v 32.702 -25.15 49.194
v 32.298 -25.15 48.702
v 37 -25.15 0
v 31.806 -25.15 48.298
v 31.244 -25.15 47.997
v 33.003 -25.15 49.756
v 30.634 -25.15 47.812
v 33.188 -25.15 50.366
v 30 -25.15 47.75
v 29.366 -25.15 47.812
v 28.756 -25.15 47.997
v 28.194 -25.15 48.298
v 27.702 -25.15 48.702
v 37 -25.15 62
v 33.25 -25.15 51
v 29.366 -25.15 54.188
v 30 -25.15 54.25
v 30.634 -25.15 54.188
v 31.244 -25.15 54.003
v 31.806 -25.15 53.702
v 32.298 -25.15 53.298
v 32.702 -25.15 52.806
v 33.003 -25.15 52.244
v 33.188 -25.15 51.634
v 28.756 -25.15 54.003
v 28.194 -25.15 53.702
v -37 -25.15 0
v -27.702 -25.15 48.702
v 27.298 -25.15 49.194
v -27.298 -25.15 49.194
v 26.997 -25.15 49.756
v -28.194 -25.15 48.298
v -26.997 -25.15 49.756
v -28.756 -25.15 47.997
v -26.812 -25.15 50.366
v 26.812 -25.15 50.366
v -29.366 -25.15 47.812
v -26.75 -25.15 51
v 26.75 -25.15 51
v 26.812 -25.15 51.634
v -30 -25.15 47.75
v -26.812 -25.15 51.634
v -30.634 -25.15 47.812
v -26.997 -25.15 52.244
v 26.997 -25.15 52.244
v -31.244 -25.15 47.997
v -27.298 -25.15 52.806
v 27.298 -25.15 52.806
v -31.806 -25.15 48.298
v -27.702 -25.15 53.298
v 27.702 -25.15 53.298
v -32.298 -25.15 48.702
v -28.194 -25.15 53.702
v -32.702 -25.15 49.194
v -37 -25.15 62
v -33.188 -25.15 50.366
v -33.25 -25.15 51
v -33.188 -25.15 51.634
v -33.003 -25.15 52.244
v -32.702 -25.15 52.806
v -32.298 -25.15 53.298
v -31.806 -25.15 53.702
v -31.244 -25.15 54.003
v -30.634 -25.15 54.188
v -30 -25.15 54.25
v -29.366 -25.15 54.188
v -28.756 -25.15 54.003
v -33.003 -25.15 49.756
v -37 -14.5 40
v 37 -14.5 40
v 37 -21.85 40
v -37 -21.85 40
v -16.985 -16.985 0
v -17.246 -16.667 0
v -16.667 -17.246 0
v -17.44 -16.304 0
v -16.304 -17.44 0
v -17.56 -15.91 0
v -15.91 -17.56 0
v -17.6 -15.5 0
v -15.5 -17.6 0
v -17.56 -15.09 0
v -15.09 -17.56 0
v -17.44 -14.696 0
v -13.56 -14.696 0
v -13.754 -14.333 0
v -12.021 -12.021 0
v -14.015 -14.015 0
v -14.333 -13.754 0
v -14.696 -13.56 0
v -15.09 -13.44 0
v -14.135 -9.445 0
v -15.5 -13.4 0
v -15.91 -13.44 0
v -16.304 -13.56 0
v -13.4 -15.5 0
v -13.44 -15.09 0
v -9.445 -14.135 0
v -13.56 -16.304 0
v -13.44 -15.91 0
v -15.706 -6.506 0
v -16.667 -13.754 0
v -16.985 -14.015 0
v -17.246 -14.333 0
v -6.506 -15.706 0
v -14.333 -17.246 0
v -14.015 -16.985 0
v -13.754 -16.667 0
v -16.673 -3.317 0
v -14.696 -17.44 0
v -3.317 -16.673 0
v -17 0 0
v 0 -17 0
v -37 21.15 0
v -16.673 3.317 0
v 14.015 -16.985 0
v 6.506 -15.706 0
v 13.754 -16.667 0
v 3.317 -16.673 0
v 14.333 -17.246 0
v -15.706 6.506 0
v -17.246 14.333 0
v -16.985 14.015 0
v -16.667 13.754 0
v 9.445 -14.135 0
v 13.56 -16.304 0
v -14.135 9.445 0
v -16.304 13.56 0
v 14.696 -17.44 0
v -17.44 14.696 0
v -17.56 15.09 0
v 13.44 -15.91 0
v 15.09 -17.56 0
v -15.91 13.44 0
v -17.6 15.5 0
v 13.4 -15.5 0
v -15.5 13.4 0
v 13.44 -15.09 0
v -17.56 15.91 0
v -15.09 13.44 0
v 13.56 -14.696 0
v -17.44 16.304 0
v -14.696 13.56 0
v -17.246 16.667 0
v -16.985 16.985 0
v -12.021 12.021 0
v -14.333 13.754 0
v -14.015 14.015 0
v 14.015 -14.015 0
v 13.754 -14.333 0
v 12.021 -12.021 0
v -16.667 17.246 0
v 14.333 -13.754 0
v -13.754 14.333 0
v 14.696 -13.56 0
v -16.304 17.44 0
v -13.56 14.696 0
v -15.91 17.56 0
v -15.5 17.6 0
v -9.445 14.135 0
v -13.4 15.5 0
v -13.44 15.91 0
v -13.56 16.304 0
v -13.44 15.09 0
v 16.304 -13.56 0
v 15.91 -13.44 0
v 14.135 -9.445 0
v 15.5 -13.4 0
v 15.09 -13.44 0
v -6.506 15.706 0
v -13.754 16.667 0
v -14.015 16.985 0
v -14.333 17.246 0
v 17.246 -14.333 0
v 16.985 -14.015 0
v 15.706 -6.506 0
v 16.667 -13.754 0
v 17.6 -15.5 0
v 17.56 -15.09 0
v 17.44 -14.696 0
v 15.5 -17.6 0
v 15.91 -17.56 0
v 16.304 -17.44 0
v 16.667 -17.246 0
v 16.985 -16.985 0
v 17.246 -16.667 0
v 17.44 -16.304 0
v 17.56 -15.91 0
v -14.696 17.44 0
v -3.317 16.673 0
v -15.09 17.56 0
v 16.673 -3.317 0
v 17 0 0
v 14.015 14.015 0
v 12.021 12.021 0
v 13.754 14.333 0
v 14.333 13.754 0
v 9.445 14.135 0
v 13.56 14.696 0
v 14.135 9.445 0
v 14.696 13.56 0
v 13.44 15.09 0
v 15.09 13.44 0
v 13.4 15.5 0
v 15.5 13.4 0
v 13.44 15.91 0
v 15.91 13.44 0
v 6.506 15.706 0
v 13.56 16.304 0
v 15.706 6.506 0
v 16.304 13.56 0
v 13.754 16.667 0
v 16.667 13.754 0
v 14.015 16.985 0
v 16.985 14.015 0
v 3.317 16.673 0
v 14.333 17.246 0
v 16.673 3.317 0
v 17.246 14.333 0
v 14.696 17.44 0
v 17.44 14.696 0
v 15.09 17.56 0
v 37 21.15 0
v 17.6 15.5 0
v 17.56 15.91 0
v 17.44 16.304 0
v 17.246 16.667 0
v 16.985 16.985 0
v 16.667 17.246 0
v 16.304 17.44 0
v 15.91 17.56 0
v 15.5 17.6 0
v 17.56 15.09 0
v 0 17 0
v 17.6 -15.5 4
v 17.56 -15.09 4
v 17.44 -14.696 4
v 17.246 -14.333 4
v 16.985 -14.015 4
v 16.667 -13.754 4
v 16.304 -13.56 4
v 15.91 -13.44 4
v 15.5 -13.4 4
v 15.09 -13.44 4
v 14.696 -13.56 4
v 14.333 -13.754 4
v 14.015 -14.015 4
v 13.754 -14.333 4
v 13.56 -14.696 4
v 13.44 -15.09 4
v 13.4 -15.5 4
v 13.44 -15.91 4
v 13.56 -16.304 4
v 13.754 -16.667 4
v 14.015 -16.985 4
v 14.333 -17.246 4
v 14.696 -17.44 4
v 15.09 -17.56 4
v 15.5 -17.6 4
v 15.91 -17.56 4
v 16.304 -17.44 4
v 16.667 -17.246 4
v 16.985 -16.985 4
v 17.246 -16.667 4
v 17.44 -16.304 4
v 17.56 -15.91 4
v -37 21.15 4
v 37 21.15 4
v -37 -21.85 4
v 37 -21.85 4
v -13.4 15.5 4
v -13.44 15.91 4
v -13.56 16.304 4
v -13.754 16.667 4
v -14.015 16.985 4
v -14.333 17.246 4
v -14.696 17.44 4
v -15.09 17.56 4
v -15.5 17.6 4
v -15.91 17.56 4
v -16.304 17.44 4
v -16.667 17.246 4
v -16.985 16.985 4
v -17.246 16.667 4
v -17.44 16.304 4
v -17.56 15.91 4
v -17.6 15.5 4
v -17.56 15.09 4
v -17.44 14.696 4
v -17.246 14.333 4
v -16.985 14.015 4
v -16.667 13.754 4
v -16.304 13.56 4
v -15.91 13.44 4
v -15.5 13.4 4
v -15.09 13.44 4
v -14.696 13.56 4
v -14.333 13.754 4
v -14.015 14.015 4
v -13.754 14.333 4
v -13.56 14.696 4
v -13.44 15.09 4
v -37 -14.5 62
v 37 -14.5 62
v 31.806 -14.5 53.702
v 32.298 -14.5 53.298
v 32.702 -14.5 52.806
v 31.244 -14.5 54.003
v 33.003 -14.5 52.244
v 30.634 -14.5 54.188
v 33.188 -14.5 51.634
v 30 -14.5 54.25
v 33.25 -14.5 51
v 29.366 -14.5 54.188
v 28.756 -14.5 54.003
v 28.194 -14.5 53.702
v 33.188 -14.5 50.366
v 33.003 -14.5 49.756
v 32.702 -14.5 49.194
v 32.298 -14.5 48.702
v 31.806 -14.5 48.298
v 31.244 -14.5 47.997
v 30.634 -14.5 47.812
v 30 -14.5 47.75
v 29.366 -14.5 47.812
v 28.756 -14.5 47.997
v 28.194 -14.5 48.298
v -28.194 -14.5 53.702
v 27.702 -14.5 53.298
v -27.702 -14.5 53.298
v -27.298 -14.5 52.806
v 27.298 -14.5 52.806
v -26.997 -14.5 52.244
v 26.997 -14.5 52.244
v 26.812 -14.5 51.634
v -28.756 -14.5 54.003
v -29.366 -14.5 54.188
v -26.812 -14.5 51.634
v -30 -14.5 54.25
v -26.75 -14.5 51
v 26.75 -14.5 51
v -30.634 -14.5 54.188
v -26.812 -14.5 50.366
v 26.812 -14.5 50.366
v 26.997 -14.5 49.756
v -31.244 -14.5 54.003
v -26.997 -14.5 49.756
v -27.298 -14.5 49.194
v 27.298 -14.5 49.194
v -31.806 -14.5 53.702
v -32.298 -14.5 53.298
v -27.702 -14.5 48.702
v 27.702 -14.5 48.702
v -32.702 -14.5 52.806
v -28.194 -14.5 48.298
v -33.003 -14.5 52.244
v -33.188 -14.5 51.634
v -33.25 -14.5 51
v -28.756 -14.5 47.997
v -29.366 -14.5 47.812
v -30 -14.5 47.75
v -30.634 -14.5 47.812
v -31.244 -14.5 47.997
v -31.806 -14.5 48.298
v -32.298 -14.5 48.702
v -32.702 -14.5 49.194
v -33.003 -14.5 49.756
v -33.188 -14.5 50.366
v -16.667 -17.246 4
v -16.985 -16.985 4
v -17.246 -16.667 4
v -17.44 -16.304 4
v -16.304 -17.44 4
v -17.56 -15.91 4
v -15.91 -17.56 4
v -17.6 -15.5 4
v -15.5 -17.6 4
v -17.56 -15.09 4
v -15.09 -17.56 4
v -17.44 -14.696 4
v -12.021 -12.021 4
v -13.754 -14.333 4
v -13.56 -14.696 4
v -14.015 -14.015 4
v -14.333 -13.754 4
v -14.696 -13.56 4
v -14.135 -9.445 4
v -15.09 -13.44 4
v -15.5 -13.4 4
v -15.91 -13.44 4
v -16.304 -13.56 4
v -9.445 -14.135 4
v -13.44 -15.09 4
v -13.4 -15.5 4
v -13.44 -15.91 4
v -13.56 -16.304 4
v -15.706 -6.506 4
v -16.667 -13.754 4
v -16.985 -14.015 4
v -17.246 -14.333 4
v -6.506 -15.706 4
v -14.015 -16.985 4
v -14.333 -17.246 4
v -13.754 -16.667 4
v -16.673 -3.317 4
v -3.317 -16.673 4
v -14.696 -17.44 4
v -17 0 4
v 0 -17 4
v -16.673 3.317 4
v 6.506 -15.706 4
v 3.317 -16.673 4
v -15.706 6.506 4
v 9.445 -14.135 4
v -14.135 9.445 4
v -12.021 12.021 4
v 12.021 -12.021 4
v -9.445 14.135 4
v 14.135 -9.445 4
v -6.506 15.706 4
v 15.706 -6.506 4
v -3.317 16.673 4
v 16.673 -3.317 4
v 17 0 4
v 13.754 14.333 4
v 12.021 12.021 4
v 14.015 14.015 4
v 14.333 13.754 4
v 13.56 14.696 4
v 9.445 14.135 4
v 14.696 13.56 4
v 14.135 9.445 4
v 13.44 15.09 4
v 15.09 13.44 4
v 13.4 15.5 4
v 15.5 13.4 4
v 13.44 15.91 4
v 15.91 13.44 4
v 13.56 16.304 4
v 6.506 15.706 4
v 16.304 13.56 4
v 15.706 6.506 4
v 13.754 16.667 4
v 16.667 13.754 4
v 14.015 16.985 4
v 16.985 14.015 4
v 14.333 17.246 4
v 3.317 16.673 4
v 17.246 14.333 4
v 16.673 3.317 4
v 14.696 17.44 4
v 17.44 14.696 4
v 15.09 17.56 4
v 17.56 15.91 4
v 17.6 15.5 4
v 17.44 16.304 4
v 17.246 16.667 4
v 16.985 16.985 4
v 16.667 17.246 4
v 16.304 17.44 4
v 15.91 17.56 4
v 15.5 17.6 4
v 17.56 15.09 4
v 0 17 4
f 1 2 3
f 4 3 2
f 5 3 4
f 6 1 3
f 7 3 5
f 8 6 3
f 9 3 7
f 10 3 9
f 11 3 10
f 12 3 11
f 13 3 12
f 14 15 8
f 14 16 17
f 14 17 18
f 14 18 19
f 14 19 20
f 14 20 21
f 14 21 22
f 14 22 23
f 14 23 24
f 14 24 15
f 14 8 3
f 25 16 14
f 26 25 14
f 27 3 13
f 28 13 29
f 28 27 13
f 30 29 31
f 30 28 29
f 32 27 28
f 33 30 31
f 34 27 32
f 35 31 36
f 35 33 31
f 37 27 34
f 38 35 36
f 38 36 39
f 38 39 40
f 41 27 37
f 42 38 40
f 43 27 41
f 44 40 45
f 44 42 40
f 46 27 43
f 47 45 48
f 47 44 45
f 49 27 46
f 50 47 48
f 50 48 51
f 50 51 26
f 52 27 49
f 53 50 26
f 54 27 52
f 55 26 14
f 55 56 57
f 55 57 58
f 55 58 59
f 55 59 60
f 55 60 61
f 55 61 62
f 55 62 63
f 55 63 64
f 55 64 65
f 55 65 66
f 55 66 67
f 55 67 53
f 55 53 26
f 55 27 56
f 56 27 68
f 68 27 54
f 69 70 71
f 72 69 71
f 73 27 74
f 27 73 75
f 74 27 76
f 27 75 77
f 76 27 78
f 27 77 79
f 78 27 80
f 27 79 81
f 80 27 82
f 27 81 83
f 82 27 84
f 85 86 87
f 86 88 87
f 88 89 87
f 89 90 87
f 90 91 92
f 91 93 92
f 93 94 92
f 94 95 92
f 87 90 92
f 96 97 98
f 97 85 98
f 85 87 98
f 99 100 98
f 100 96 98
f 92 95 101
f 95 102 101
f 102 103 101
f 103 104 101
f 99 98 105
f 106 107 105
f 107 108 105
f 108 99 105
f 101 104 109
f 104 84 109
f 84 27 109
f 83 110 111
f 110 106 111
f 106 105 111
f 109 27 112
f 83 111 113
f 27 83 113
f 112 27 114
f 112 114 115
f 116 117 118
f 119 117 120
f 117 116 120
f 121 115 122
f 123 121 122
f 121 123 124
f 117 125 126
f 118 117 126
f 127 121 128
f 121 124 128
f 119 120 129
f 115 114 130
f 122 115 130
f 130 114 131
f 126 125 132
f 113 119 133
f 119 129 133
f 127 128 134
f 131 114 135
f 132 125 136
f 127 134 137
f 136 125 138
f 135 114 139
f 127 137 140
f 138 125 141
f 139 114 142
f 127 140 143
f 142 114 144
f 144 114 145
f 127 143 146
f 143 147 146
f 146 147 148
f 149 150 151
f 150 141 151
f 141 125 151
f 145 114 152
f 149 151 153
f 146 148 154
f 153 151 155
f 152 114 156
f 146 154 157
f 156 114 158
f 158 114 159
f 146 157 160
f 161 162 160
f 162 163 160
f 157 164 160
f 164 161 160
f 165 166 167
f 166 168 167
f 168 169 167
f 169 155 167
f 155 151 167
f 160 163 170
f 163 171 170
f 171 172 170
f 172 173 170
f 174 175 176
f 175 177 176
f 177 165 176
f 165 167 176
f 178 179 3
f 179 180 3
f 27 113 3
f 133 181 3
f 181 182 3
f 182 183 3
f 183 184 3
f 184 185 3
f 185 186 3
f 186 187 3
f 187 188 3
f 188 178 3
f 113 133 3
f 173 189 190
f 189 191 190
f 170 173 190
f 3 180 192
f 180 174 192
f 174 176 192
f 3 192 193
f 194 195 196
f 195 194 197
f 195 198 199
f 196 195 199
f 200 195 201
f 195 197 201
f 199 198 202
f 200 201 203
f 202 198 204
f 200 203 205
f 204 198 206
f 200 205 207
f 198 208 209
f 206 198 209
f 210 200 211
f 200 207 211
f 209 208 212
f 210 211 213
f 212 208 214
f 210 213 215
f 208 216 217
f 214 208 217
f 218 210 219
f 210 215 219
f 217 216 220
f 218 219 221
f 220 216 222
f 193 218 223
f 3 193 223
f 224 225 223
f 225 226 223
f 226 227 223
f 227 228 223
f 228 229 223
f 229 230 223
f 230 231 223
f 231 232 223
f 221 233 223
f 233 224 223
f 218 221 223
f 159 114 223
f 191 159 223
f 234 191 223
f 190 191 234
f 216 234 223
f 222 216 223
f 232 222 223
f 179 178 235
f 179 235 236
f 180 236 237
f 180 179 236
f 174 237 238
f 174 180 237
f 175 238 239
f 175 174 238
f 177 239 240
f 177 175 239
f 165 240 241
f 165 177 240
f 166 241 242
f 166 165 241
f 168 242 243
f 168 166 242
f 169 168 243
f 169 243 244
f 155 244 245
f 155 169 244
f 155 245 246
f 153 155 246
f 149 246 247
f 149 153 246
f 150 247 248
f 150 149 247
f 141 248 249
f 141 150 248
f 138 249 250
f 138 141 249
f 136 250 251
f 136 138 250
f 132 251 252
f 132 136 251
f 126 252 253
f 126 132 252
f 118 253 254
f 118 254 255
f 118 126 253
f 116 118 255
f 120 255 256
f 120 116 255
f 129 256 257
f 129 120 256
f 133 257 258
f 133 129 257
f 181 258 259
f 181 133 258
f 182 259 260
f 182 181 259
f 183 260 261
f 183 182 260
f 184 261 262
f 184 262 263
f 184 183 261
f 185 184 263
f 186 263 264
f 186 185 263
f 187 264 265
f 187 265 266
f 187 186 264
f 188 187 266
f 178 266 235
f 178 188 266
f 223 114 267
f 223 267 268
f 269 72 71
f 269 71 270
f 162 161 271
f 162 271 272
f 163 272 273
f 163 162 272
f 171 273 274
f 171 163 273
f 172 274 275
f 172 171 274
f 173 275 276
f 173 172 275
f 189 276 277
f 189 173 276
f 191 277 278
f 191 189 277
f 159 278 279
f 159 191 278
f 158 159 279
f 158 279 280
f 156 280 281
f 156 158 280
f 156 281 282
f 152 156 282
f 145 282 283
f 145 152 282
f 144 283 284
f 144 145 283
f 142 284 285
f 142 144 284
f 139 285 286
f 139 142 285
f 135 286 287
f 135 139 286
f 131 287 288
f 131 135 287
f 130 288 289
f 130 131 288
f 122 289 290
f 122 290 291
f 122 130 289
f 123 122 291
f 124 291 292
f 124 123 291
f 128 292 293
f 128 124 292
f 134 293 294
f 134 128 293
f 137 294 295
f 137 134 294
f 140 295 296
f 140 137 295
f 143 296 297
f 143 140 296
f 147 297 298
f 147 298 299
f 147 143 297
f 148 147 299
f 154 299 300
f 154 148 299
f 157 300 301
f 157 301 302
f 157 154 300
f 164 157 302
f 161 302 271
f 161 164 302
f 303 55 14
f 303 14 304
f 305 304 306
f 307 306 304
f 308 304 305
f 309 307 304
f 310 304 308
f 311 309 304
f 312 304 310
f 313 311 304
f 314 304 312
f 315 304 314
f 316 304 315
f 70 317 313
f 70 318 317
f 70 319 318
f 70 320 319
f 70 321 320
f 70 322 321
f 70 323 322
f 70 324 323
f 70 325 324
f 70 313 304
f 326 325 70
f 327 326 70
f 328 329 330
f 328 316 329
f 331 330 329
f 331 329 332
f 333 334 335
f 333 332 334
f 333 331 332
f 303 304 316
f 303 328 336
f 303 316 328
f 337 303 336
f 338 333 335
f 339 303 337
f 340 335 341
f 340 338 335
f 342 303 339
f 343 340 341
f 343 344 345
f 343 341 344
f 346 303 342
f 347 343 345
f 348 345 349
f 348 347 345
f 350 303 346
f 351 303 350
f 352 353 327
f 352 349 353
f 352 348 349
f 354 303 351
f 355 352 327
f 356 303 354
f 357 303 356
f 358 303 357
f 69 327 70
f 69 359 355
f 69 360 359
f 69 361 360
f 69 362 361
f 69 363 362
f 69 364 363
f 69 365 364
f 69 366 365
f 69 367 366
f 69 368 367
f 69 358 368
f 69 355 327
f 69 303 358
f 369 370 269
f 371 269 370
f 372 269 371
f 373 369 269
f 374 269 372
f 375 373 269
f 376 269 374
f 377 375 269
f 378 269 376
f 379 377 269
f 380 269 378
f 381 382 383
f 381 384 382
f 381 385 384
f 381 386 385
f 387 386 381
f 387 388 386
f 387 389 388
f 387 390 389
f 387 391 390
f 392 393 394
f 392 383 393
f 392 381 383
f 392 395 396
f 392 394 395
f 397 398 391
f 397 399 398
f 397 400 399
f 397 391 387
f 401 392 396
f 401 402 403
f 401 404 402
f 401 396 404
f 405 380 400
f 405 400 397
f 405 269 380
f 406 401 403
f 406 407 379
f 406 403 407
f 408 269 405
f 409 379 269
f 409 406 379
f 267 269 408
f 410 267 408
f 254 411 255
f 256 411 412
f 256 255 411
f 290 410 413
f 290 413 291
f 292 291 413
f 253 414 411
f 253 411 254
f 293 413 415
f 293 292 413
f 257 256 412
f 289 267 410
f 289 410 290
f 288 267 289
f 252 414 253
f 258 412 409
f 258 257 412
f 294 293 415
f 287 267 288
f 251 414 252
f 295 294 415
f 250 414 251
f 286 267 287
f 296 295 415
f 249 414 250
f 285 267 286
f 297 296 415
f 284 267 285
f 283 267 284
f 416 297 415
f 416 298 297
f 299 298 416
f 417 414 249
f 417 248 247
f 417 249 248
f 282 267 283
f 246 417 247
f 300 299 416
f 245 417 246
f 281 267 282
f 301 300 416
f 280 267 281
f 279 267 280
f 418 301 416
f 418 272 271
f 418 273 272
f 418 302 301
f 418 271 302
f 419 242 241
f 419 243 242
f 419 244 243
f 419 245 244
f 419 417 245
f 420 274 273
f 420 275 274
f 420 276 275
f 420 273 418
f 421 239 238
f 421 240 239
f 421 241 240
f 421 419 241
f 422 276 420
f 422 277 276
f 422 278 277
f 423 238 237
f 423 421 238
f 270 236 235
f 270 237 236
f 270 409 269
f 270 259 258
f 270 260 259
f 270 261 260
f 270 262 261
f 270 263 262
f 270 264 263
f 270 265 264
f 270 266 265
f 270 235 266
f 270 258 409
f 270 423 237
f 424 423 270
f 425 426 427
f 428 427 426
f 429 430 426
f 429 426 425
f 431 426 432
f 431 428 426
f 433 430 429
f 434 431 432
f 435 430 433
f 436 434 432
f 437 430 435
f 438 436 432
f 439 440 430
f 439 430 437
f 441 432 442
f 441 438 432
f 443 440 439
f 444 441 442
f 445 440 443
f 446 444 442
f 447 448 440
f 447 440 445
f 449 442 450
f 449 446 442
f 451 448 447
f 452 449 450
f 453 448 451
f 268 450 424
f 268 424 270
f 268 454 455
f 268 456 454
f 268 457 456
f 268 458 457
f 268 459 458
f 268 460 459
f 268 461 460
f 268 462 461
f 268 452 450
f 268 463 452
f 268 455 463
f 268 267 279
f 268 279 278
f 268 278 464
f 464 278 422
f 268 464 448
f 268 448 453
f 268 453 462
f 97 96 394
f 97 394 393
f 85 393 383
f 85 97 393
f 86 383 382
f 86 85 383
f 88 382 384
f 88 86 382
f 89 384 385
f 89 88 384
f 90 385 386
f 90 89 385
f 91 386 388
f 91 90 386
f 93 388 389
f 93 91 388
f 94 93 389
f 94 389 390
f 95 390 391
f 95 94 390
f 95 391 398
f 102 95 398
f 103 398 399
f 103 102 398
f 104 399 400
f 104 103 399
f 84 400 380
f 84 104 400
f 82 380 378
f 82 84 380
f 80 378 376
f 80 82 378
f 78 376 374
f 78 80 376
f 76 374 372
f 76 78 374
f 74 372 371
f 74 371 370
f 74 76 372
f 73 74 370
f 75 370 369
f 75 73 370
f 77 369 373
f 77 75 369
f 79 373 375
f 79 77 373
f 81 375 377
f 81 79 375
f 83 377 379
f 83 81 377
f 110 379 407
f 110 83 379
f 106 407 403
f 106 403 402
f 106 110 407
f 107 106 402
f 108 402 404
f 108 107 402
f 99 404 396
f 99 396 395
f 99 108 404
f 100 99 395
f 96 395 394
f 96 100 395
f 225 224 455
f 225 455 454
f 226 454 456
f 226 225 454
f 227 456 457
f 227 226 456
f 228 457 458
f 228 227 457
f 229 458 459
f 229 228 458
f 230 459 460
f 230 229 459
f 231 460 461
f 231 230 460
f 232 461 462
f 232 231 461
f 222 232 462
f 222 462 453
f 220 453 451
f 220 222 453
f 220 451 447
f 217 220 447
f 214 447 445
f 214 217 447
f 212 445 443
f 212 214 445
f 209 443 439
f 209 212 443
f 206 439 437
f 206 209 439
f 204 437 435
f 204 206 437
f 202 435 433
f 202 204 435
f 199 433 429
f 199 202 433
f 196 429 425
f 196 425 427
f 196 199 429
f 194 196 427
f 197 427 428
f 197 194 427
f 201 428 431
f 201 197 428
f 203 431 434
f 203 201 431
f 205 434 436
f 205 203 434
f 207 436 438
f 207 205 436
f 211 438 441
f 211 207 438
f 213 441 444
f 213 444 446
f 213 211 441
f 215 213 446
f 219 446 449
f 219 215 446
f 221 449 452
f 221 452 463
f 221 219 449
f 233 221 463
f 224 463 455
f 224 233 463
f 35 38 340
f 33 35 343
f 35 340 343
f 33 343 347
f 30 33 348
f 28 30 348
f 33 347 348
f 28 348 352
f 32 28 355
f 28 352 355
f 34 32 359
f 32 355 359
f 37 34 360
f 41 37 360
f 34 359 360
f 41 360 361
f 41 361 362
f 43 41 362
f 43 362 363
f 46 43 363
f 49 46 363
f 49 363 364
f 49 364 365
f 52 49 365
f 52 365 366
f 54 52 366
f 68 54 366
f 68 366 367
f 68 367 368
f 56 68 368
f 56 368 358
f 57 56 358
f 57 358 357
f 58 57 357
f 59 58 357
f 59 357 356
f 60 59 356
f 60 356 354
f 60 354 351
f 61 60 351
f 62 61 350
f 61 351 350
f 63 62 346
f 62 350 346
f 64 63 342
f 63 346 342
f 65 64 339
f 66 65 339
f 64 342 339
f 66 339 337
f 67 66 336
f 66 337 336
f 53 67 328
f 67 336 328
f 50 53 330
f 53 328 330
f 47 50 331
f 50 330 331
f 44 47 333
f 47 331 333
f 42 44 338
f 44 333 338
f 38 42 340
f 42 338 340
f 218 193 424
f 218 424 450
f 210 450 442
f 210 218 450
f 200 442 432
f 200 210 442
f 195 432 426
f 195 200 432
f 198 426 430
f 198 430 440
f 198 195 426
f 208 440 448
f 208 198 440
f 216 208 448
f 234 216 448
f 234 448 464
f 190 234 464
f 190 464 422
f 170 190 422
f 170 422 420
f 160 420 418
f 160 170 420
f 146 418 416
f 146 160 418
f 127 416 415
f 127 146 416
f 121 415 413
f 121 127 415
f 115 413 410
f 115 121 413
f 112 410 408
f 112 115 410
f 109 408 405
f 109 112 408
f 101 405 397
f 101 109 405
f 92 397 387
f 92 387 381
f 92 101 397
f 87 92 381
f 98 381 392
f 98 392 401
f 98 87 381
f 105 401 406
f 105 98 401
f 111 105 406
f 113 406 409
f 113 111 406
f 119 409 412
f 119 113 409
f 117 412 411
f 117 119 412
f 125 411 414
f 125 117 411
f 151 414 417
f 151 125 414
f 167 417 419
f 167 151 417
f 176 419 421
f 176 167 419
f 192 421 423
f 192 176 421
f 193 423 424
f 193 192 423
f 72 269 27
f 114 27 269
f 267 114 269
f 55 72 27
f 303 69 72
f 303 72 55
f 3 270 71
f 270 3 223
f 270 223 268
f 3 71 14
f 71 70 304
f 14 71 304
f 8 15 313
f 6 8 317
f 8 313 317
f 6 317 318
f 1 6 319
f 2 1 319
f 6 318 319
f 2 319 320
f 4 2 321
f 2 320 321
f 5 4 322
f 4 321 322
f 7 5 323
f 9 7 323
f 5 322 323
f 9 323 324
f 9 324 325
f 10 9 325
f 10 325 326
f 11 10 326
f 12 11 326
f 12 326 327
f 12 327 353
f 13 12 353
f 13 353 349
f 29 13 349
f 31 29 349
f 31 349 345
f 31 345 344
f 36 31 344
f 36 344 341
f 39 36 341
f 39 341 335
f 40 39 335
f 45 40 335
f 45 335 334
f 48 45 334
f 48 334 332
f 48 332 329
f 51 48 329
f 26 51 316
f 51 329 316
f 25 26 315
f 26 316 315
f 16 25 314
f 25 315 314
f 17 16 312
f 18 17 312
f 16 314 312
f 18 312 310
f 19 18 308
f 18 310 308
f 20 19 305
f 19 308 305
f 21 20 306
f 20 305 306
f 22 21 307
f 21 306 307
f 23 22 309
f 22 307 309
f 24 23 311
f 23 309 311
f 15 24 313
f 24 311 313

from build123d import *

# Parameters (mm, degrees)
CROQUIS1_W              = 74
CROQUIS1_H              = 46.3
CROQUIS1_R              = 17
CROQUIS1_R_2            = 2.1
SALIENTE_EXTRUIR1_DEPTH = 4
SALIENTE_EXTRUIR3_DEPTH = 74
CORTAR_EXTRUIR2_REACH   = 12.65
CROQUIS6_R              = 3.25


with BuildPart() as part:
    # Croquis1 → Saliente-Extruir1 (new body)
    with BuildSketch(Plane.XY):
        with Locations((0, -2)):
            Rectangle(CROQUIS1_W, CROQUIS1_H)
        Circle(CROQUIS1_R, mode=Mode.SUBTRACT)
        with Locations((-15.5, -15.5)):
            Circle(CROQUIS1_R_2, mode=Mode.SUBTRACT)
        with Locations((-15.5, 15.5)):
            Circle(CROQUIS1_R_2, mode=Mode.SUBTRACT)
        with Locations((15.5, -15.5)):
            Circle(CROQUIS1_R_2, mode=Mode.SUBTRACT)
        with Locations((15.5, 15.5)):
            Circle(CROQUIS1_R_2, mode=Mode.SUBTRACT)
    extrude(amount=SALIENTE_EXTRUIR1_DEPTH)

    # Croquis5 → Saliente-Extruir3 (add)
    with BuildSketch(Plane.ZY.offset(37)):
        Polygon((4, -25.15), (62, -25.15), (62, -14.5), (40, -14.5), (40, -21.85), (4, -21.85), align=None)
    extrude(amount=-SALIENTE_EXTRUIR3_DEPTH)

    # Croquis6 → Cortar-Extruir2 (cut, up to next)
    with BuildSketch(Plane(origin=(0, -14.5, 0), x_dir=(1, 0, 0), z_dir=(0, 1, 0)), mode=Mode.PRIVATE) as cortar_extruir2_sk1:
        with Locations((-30, -51)):
            Circle(CROQUIS6_R)
    cortar_extruir2_tool1 = extrude(cortar_extruir2_sk1.sketch, amount=-CORTAR_EXTRUIR2_REACH, mode=Mode.PRIVATE) & part.part
    add(cortar_extruir2_tool1.solids().sort_by_distance((-30, -14.5, 51))[0], mode=Mode.SUBTRACT)
    # Croquis6 → Cortar-Extruir2 (cut, up to next)
    with BuildSketch(Plane(origin=(0, -14.5, 0), x_dir=(1, 0, 0), z_dir=(0, 1, 0)), mode=Mode.PRIVATE) as cortar_extruir2_sk2:
        with Locations((30, -51)):
            Circle(CROQUIS6_R)
    cortar_extruir2_tool2 = extrude(cortar_extruir2_sk2.sketch, amount=-CORTAR_EXTRUIR2_REACH, mode=Mode.PRIVATE) & part.part
    add(cortar_extruir2_tool2.solids().sort_by_distance((30, -14.5, 51))[0], mode=Mode.SUBTRACT)


solid = part.part
